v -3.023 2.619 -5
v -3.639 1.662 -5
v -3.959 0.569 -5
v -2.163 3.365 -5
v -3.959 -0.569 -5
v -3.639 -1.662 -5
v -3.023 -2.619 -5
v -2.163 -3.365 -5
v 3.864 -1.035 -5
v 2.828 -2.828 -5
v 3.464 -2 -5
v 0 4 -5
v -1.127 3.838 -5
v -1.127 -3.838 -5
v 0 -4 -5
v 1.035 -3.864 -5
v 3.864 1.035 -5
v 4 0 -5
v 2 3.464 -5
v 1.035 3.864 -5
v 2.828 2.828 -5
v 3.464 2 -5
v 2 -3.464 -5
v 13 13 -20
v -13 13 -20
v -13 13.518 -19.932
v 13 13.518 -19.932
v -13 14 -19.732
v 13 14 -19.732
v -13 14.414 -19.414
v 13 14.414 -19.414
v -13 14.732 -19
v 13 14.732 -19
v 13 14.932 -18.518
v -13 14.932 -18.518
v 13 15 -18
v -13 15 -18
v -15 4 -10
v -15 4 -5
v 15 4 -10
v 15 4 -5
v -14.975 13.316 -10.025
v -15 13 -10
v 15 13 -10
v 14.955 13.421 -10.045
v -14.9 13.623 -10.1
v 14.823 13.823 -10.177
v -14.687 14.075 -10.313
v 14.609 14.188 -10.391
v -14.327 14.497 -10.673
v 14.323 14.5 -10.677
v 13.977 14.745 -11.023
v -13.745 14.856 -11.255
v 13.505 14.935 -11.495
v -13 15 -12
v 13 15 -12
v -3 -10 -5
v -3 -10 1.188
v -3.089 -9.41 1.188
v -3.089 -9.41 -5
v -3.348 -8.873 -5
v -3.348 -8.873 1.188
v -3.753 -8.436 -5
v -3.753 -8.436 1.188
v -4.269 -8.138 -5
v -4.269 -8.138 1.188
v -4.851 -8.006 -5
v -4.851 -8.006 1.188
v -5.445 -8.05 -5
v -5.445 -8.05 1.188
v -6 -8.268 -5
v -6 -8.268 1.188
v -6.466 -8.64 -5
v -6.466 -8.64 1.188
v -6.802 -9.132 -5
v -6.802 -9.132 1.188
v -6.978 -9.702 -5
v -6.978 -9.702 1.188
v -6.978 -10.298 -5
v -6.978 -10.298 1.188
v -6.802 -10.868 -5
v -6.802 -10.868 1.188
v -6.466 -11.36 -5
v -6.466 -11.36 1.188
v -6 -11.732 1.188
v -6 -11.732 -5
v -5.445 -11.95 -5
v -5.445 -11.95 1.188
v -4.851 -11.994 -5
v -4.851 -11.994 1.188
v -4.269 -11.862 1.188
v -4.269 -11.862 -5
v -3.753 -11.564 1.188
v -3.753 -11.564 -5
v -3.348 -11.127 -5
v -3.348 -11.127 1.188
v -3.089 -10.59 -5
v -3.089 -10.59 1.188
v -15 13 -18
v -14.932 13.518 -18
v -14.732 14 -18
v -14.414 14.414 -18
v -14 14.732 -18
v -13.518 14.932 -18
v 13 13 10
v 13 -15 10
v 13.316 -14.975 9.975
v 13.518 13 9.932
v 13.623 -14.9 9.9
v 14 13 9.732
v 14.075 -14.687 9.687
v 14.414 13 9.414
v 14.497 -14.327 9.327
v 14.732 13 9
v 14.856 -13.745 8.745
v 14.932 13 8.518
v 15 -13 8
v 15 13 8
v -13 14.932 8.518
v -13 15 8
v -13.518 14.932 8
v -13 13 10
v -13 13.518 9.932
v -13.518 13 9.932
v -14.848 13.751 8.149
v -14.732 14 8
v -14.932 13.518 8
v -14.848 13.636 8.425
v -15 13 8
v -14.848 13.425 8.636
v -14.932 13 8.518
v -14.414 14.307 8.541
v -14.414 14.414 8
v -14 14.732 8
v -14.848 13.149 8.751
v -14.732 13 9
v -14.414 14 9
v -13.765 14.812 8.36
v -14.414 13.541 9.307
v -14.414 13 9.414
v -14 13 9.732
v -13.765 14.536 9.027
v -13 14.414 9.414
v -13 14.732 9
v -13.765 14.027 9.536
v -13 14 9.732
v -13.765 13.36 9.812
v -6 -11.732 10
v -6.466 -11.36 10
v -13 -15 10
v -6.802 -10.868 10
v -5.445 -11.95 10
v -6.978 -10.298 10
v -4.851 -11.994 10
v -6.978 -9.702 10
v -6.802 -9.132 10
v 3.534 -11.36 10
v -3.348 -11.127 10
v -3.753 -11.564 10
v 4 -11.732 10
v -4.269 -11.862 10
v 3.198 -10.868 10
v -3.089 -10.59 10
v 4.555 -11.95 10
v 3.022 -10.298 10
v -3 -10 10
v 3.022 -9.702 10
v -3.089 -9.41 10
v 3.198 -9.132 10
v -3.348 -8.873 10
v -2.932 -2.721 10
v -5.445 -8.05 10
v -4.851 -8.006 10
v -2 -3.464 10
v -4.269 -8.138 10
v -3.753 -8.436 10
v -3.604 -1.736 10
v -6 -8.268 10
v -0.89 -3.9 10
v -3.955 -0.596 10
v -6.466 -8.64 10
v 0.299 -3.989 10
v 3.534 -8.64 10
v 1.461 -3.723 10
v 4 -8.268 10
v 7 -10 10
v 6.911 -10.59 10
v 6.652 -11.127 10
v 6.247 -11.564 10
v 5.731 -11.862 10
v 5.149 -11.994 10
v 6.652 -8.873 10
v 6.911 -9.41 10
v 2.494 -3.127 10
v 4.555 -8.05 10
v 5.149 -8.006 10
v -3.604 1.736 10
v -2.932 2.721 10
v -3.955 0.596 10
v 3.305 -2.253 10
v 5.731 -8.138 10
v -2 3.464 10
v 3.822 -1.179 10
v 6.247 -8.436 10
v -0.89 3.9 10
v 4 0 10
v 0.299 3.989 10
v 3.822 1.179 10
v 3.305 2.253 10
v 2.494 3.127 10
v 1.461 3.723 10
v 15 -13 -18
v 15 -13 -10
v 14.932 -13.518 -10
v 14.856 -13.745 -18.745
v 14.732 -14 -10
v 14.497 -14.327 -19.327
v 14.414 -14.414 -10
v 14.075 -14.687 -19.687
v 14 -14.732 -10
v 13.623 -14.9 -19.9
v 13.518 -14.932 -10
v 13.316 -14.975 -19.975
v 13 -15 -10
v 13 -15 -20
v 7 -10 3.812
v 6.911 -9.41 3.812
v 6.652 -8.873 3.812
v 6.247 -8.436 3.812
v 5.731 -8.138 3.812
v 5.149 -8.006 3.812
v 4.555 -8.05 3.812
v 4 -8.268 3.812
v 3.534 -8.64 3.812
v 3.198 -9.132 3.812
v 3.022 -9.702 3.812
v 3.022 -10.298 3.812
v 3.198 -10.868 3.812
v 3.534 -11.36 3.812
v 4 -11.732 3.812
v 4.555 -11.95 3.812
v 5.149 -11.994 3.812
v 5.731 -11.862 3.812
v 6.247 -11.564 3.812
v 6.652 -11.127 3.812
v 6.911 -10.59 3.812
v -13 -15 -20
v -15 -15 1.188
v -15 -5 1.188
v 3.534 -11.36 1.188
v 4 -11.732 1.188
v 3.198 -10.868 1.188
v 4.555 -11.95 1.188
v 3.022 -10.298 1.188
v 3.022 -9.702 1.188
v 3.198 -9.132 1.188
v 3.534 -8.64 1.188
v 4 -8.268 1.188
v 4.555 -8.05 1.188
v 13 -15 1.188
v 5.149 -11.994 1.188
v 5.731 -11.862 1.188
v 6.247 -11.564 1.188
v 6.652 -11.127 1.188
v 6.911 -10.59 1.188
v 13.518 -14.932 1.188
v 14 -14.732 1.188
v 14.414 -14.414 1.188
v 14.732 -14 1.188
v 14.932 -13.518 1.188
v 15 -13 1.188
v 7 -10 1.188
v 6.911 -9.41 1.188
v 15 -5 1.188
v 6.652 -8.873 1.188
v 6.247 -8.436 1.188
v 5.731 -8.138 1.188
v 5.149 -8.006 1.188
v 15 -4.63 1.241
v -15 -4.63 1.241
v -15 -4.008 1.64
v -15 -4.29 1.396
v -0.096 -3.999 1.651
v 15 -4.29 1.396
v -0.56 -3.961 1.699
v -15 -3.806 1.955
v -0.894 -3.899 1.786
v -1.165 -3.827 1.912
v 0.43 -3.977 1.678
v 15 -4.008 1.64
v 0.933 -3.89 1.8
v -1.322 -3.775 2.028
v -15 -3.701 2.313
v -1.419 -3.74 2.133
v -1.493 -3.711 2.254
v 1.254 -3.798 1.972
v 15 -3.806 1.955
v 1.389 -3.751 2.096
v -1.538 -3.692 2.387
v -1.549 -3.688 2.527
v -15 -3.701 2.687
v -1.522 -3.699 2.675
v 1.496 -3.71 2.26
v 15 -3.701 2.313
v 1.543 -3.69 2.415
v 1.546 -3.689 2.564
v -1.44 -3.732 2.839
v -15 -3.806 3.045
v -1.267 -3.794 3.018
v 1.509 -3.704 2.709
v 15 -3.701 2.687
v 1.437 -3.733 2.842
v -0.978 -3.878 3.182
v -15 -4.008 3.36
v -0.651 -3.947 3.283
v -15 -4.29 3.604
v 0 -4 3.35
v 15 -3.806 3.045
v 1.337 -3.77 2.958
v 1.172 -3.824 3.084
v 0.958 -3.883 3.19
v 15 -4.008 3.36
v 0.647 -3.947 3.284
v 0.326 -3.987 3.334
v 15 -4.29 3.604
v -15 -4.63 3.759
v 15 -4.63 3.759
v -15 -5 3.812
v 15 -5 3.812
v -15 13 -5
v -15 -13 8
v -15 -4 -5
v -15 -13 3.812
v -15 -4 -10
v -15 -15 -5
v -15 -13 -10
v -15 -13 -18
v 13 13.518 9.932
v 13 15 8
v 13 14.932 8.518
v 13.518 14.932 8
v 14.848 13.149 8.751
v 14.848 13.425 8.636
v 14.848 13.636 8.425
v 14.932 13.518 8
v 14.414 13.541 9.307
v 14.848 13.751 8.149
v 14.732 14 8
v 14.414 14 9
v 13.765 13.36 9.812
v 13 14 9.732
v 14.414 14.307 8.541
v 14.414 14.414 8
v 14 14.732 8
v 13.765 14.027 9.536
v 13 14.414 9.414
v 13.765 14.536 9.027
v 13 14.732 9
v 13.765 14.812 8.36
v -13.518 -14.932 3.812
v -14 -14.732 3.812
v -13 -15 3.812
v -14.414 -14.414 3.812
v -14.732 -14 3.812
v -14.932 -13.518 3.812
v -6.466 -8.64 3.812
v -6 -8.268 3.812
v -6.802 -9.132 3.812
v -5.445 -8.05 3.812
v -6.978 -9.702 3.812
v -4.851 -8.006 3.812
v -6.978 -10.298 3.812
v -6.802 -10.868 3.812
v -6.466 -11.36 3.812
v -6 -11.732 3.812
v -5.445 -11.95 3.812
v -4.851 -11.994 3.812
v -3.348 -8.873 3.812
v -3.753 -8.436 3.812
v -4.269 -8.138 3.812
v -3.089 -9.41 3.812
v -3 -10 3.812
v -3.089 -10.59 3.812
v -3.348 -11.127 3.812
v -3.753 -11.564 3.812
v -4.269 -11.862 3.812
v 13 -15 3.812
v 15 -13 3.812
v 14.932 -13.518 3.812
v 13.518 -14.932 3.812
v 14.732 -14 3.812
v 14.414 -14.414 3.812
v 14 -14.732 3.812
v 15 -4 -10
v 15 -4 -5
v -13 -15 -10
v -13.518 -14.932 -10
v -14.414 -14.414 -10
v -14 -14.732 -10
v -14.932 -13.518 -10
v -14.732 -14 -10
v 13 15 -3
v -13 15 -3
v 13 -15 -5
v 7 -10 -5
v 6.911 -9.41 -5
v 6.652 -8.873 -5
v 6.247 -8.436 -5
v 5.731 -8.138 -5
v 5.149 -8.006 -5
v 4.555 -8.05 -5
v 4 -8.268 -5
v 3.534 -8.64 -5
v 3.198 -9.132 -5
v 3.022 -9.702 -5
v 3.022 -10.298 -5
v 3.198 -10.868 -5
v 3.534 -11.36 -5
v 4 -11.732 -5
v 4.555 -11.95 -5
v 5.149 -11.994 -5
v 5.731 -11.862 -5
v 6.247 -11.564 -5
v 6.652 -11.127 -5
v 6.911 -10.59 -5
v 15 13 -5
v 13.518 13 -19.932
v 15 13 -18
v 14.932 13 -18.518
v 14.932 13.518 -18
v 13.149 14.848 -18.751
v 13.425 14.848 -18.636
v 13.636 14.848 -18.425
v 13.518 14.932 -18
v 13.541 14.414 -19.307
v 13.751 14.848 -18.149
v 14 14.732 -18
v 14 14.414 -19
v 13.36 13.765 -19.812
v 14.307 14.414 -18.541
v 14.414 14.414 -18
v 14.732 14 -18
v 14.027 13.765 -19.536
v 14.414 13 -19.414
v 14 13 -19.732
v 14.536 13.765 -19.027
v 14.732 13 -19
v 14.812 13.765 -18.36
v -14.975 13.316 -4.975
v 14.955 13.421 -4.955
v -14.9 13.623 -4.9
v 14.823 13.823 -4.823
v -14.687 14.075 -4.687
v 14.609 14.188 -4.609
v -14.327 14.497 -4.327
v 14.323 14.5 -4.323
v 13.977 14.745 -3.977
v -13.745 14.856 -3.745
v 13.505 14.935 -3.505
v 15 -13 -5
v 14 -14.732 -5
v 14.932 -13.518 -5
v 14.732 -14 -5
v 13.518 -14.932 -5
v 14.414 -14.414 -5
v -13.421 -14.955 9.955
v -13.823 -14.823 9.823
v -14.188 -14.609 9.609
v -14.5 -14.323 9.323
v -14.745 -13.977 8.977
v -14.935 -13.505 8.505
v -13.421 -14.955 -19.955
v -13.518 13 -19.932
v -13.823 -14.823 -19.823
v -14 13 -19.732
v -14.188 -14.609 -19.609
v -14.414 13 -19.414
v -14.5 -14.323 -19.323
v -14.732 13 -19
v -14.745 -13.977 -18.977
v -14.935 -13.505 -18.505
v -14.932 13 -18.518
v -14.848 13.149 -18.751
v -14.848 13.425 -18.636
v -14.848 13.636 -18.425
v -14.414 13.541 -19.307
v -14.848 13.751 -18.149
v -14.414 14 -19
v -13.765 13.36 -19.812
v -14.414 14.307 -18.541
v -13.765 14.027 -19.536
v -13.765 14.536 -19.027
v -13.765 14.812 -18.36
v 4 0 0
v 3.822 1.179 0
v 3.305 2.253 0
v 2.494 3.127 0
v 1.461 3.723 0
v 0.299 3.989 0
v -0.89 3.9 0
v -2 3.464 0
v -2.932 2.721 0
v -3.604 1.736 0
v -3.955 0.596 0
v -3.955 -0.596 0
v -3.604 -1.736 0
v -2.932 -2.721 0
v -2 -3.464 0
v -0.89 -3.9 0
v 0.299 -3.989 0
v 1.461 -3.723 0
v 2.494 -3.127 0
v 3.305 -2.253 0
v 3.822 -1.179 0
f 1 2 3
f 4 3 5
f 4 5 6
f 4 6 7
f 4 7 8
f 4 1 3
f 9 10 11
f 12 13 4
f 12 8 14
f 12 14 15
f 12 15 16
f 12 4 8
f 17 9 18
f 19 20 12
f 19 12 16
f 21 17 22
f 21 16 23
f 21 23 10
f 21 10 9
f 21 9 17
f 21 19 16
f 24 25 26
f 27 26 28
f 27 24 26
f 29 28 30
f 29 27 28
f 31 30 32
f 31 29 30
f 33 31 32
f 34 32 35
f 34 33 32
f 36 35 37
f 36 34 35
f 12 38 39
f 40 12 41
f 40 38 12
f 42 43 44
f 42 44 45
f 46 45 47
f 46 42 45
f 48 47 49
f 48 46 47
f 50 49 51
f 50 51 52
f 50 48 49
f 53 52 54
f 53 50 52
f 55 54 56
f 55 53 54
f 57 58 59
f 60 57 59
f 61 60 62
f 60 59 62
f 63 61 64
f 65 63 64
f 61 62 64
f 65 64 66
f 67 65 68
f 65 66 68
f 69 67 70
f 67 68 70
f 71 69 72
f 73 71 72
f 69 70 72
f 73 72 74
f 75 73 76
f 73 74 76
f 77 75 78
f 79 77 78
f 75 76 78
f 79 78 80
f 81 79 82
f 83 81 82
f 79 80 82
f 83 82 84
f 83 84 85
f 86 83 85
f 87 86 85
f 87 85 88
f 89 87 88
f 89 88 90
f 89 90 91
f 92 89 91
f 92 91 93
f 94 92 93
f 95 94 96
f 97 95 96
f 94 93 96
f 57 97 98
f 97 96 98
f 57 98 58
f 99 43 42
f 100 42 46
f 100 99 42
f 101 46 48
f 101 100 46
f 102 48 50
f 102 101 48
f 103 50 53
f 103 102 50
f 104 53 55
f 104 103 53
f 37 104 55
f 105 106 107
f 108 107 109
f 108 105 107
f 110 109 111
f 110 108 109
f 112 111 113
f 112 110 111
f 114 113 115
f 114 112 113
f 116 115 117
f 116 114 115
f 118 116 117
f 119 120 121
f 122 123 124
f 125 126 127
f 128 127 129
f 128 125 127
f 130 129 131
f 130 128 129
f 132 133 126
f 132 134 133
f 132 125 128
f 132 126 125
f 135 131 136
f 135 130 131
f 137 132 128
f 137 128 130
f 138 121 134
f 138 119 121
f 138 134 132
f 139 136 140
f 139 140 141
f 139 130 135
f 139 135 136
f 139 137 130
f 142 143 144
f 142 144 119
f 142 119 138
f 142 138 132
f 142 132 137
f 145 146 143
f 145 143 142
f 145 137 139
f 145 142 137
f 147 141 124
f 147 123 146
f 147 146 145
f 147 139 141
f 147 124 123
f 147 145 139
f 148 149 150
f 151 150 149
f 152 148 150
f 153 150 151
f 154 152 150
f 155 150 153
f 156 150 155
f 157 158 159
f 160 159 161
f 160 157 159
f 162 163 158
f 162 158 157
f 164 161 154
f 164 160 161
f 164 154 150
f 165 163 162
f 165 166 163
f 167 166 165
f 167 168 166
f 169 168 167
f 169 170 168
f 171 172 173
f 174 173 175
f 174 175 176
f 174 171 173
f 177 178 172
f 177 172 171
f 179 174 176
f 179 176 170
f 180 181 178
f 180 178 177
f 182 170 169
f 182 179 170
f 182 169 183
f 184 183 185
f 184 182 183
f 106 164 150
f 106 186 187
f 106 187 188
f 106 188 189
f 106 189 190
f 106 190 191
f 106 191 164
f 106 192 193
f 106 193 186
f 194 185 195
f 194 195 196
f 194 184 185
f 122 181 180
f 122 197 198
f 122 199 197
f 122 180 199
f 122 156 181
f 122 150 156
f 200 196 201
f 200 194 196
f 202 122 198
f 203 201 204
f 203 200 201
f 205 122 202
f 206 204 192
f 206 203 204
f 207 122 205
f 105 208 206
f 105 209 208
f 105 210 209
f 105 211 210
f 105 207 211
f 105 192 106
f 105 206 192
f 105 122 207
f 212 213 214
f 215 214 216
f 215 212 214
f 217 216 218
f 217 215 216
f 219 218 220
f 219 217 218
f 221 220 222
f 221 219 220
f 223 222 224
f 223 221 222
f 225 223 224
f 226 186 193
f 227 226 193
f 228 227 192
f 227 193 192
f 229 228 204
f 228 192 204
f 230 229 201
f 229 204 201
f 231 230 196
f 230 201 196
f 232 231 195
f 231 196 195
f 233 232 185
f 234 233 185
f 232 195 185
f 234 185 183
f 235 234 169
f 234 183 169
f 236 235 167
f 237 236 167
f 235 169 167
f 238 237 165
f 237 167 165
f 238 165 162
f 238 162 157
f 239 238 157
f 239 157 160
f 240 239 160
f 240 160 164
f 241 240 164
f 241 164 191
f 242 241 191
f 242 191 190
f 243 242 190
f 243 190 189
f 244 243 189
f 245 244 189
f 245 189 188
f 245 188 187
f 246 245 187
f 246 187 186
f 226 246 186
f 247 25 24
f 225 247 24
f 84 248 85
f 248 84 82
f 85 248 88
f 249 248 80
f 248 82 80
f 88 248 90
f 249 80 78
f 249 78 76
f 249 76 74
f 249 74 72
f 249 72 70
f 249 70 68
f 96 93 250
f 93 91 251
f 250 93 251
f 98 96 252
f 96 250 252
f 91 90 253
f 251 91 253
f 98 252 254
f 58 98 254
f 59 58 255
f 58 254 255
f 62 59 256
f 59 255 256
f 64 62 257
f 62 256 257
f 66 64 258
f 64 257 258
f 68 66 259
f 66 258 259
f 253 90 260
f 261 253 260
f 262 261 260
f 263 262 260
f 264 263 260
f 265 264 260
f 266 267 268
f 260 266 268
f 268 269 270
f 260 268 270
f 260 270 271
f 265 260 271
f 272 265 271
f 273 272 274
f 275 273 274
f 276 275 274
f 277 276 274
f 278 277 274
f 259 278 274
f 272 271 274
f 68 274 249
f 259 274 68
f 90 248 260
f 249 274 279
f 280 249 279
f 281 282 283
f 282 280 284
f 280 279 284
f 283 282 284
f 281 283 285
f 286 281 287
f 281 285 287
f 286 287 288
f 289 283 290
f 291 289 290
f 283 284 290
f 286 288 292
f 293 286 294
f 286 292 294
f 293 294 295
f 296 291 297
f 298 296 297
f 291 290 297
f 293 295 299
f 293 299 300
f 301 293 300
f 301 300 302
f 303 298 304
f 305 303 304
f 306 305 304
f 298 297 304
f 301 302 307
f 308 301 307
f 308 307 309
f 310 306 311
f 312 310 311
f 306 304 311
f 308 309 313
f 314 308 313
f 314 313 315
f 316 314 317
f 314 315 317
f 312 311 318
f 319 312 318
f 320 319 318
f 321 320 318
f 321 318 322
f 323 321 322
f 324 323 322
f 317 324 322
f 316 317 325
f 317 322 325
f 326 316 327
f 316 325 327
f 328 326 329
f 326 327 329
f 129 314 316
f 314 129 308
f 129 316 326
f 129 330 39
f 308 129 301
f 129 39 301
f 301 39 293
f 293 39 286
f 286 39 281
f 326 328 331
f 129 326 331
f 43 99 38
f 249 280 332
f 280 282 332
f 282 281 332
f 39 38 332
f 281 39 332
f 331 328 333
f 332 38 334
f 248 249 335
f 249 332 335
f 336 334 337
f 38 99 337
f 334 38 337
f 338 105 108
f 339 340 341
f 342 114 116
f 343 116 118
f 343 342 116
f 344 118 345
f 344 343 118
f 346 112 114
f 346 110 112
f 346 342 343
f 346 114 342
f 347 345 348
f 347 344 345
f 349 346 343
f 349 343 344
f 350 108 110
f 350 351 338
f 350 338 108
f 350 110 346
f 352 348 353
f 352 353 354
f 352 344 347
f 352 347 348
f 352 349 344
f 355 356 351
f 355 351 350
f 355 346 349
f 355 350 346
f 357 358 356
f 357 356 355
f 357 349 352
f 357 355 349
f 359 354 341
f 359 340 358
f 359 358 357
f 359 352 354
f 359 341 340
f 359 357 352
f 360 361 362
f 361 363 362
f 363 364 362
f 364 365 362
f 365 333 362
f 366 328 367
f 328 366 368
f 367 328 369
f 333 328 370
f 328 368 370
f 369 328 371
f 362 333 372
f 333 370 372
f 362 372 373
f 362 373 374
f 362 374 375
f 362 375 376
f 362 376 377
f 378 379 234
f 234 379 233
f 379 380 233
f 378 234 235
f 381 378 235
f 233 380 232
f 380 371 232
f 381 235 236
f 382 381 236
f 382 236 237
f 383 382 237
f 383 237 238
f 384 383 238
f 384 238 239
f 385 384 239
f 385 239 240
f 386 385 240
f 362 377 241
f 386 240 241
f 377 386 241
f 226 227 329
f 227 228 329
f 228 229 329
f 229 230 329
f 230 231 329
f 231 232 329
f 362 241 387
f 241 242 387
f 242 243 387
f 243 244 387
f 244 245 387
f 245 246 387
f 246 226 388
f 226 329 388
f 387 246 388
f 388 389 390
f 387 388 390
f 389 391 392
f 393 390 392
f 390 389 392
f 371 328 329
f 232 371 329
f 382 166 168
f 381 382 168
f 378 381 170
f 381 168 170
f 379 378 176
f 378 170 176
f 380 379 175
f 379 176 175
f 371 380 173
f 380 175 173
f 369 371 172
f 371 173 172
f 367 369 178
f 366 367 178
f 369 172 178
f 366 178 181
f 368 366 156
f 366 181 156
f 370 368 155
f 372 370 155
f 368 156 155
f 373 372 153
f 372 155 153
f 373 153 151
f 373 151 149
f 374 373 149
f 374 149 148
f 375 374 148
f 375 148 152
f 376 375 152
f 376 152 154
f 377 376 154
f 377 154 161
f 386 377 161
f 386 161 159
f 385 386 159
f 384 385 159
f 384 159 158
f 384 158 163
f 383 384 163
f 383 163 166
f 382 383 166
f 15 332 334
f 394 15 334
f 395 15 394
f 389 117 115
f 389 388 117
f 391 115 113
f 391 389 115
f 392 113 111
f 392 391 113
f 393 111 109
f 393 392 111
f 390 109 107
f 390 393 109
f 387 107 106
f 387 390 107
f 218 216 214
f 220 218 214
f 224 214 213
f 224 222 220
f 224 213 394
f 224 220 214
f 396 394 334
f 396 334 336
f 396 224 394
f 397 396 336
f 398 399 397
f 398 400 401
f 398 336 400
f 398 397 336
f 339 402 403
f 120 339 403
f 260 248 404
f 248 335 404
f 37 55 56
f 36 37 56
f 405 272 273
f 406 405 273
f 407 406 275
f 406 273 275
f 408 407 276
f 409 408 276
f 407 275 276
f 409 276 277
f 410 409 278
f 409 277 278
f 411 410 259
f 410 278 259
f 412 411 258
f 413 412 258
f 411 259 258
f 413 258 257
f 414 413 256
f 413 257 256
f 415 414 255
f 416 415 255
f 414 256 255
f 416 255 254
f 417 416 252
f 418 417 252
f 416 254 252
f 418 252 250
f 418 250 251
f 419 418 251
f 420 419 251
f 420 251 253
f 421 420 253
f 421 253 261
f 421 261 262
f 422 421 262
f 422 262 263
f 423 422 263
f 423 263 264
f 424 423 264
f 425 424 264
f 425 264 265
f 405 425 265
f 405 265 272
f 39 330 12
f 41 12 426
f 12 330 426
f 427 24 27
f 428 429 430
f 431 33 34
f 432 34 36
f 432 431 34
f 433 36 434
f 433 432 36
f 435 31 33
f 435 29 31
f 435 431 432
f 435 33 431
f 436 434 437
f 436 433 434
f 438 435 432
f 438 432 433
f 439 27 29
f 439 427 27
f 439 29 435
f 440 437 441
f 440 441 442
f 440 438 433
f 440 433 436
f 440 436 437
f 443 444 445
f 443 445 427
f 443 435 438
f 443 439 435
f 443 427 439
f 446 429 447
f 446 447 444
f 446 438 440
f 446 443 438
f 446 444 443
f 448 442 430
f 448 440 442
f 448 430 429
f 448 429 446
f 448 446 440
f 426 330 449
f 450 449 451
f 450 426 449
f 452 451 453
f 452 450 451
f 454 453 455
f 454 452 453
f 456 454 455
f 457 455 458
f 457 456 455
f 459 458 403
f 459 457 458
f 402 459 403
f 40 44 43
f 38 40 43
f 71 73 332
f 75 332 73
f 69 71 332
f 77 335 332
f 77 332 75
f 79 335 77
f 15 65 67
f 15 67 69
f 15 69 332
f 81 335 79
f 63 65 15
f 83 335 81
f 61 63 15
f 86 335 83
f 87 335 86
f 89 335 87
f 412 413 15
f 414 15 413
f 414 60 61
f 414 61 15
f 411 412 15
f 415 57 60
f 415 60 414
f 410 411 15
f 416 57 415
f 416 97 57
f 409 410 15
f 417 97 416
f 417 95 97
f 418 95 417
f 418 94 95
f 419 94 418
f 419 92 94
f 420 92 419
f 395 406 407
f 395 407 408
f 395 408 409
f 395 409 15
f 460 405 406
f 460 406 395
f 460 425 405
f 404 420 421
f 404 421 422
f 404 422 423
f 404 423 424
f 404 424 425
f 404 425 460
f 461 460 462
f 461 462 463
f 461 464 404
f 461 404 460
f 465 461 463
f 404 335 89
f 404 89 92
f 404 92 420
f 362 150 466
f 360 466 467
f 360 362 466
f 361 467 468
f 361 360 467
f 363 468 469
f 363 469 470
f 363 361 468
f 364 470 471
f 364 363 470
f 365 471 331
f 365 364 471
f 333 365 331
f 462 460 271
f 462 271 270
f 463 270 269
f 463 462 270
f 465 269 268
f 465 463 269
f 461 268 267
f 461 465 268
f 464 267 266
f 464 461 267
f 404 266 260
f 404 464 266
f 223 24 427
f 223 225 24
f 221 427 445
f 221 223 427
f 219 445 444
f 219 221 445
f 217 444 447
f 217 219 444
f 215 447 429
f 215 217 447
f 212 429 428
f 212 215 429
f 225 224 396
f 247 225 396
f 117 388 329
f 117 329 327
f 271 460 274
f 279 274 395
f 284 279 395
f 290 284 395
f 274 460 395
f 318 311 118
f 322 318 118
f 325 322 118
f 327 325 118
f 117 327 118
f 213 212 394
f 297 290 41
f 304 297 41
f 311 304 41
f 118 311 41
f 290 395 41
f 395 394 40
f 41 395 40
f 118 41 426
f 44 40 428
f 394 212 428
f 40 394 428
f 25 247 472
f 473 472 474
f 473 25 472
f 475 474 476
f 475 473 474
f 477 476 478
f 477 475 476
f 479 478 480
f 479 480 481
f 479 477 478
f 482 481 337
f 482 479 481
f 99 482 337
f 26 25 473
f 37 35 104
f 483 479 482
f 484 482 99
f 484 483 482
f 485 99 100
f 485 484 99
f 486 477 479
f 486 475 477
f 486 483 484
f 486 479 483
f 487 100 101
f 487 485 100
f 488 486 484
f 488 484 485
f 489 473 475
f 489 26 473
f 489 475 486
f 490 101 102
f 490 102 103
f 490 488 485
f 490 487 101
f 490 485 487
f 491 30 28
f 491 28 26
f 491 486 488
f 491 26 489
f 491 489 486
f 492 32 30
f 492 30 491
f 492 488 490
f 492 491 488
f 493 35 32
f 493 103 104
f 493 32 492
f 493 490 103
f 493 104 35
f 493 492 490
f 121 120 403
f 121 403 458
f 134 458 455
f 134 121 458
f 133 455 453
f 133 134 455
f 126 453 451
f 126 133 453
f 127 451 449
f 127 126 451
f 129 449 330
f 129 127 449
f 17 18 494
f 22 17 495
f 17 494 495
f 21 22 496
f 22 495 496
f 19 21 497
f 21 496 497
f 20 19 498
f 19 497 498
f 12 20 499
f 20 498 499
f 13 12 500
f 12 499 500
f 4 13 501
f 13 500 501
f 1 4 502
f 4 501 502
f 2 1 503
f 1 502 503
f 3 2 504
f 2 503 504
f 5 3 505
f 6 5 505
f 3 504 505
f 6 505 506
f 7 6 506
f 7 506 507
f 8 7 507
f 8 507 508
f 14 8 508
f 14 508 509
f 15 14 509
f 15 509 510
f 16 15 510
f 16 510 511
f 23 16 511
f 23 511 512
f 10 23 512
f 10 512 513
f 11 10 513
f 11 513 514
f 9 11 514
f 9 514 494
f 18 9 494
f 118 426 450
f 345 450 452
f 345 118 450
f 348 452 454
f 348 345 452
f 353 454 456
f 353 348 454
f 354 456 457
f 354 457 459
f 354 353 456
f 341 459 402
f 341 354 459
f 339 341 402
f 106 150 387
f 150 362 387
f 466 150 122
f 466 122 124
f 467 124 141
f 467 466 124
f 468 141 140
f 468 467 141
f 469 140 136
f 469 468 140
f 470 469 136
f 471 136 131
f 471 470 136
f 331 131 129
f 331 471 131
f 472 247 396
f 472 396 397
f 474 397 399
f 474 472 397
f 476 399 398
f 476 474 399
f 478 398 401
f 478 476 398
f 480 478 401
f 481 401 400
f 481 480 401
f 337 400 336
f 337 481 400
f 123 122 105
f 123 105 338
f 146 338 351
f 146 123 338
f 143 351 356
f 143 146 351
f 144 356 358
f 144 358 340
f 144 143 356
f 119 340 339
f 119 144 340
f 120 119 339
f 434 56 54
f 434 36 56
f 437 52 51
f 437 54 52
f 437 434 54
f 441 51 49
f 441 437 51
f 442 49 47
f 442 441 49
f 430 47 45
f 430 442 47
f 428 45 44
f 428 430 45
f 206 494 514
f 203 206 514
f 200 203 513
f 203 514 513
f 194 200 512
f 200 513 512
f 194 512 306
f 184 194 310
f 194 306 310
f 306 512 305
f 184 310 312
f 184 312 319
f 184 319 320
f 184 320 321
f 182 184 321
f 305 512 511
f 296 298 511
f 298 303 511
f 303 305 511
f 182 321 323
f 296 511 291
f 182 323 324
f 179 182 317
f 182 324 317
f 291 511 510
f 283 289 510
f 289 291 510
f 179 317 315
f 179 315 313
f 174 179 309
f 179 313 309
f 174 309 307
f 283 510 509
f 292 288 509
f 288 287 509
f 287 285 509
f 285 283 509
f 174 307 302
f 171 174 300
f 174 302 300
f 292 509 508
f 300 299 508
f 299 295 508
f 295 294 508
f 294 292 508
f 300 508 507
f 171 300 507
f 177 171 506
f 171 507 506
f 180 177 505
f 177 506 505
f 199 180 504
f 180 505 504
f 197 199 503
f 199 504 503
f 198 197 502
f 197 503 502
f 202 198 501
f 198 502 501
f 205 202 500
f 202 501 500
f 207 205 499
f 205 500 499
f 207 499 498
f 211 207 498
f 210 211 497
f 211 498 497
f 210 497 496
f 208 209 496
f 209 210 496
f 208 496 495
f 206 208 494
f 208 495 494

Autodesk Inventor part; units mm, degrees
ref_plane "YZ Plane" through (0, 0, 0) normal (1, 0, 0) x (0, 1, 0)
ref_plane "XZ Plane" through (0, 0, 0) normal (0, 1, 0) x (-1, 0, 0)
ref_plane "XY Plane" through (0, 0, 0) normal (0, 0, 1) x (1, 0, 0)
sketch "Sketch1" plane through (0, 0, 0) normal (0, 0, 1) x (1, 0, 0)
  line L0 (15, -15) -> (-15, -15)
  line L1 (-15, -15) -> (-15, 15)
  line L2 (-15, 15) -> (15, 15)
  line L3 (15, 15) -> (15, -15)
  line L4 (15, -15) -> (-15, 15) construction
  line L5 (-15, -15) -> (15, 15) construction
  point P0 (0, 0)
  dimension "d0" = 30
  dimension "d1" = 30
extrude "Extrusion1" add sketch "Sketch1" against normal blind 20
sketch "Sketch2" plane through (-15, 15, 0) normal (0, 1, 0) x (1, 0, 0)
  line L0 (30, 0) -> (30, 20) projected
  line L1 (0, 5) -> (30, 5)
  line L2 (30, 5) -> (30, 10)
  line L3 (30, 10) -> (0, 10)
  line L4 (0, 10) -> (0, 5)
  line L5 (0, 5) -> (30, 10) construction
  line L6 (30, 5) -> (0, 10) construction
  line L7 (0, 20) -> (30, 20) projected
  point P0 (15, 0)
  point P1 (15, 7.5)
  dimension "d4" = 5
  dimension "d13" = 10
extrude "Extrusion2" cut sketch "Sketch2" against normal blind 11
sketch "Sketch3" plane through (-15, -15, 0) normal (0, -1, 0) x (1, 0, 0)
  line L0 (30, 0) -> (30, -20) projected
  line L1 (0, -5) -> (30, -5)
  line L2 (30, -5) -> (30, -10)
  line L3 (30, -10) -> (0, -10)
  line L4 (0, -10) -> (0, -5)
  line L5 (0, -5) -> (30, -10) construction
  line L6 (30, -5) -> (0, -10) construction
  line L7 (30, -20) -> (0, -20) projected
  point P0 (15, 0)
  point P1 (15, -7.5)
  dimension "d7" = 5
  dimension "d14" = 10
extrude "Extrusion3" cut sketch "Sketch3" against normal blind 11
sketch "Sketch4" plane through (0, 0, 0) normal (0, 0, 1) x (1, 0, 0)
  circle A0 centre (0, 0) radius 4
  dimension "d10" = 8
extrude "Extrusion4" cut sketch "Sketch4" against normal blind 5
sketch "Sketch6" plane through (0, 0, 0) normal (0, 0, 1) x (1, 0, 0)
  line L0 (15, 15) -> (-15, 15) projected
  line L1 (-15, 15) -> (-15, -15) projected
  circle A0 centre (0, 0) radius 4 projected
  line L2 (15, 15) -> (-15, 15) projected
  line L3 (-15, 15) -> (-15, -15) projected
  line L4 (-15, -15) -> (15, -15) projected
  line L5 (15, -15) -> (15, 15) projected
extrude "Extrusion5" add sketch "Sketch6" along normal blind 10
sketch "Sketch7" plane through (15, -15, -20) normal (1, 0, 0) x (0, 0, -1)
  line L0 (-10, 30) -> (-10, 19) projected
  line L1 (-10, 19) -> (-15, 19)
  line L2 (-30, 19) -> (-15, 19) projected
  point P0 (-12.5, 15)
sketch "Sketch8" plane through (15, -15, -20) normal (1, 0, 0) x (0, 0, -1)
  line L0 (-15, 0) -> (-30, 0) projected
  line L1 (-22.5, 0) -> (-22.5, 10) construction
  line L2 (-21.1875, 0) -> (-21.1875, 10)
  line L3 (-23.8125, 10) -> (-23.8125, 0)
  arc A0 (-23.8125, 0) -> (-21.1875, 0) centre (-22.5, 0) ccw
  arc A1 (-21.1875, 10) -> (-23.8125, 10) centre (-22.5, 10) ccw
  point P0 (-20, 15)
  point P1 (-22.5, 5)
  dimension "d17" = 10
  dimension "d18" = 2.625
extrude "Extrusion6" cut sketch "Sketch8" against normal through all contours L0 L3 A1 L2
sketch "Sketch9" plane through (0, 0, 10) normal (0, 0, 1) x (1, 0, 0)
  line L0 (15, -15) -> (15, -5) projected
  line L1 (15, -15) -> (5, -15)
  line L2 (-15, -15) -> (15, -15) projected
  line L3 (5, -15) -> (5, -10)
  circle A0 centre (5, -10) radius 2
  line L4 (0, 0) -> (0, -15)
  line L5 (-15, -15) -> (-5, -15)
  line L6 (15, -15) -> (-15, -15)
  line L7 (-5, -15) -> (-5, -10)
  circle A1 centre (-5, -10) radius 2
  dimension "d21" = 10
  dimension "d22" = 5
  dimension "d23" = 4
extrude "Extrusion7" cut sketch "Sketch9" against normal blind 15
fillet "Fillet1" radius 2 17 edges at (0, 15, 10) (15, 0, 10) (-15, 0, 10) (-15, 15, 2.5) (0, 15, -5) (15, 15, 2.5) (15, -15, -1.9062) (15, -15, 6.9062) (15, 0, -20) (15, 15, -15) (0, 15, -20) (-15, 15, -15) (0, 15, -10) (15, -15, -15) (-15, 0, -20) (-15, -15, -15) (-15, -15, 6.9062)
properties part number "Corredera" material "Iron, Cast"
